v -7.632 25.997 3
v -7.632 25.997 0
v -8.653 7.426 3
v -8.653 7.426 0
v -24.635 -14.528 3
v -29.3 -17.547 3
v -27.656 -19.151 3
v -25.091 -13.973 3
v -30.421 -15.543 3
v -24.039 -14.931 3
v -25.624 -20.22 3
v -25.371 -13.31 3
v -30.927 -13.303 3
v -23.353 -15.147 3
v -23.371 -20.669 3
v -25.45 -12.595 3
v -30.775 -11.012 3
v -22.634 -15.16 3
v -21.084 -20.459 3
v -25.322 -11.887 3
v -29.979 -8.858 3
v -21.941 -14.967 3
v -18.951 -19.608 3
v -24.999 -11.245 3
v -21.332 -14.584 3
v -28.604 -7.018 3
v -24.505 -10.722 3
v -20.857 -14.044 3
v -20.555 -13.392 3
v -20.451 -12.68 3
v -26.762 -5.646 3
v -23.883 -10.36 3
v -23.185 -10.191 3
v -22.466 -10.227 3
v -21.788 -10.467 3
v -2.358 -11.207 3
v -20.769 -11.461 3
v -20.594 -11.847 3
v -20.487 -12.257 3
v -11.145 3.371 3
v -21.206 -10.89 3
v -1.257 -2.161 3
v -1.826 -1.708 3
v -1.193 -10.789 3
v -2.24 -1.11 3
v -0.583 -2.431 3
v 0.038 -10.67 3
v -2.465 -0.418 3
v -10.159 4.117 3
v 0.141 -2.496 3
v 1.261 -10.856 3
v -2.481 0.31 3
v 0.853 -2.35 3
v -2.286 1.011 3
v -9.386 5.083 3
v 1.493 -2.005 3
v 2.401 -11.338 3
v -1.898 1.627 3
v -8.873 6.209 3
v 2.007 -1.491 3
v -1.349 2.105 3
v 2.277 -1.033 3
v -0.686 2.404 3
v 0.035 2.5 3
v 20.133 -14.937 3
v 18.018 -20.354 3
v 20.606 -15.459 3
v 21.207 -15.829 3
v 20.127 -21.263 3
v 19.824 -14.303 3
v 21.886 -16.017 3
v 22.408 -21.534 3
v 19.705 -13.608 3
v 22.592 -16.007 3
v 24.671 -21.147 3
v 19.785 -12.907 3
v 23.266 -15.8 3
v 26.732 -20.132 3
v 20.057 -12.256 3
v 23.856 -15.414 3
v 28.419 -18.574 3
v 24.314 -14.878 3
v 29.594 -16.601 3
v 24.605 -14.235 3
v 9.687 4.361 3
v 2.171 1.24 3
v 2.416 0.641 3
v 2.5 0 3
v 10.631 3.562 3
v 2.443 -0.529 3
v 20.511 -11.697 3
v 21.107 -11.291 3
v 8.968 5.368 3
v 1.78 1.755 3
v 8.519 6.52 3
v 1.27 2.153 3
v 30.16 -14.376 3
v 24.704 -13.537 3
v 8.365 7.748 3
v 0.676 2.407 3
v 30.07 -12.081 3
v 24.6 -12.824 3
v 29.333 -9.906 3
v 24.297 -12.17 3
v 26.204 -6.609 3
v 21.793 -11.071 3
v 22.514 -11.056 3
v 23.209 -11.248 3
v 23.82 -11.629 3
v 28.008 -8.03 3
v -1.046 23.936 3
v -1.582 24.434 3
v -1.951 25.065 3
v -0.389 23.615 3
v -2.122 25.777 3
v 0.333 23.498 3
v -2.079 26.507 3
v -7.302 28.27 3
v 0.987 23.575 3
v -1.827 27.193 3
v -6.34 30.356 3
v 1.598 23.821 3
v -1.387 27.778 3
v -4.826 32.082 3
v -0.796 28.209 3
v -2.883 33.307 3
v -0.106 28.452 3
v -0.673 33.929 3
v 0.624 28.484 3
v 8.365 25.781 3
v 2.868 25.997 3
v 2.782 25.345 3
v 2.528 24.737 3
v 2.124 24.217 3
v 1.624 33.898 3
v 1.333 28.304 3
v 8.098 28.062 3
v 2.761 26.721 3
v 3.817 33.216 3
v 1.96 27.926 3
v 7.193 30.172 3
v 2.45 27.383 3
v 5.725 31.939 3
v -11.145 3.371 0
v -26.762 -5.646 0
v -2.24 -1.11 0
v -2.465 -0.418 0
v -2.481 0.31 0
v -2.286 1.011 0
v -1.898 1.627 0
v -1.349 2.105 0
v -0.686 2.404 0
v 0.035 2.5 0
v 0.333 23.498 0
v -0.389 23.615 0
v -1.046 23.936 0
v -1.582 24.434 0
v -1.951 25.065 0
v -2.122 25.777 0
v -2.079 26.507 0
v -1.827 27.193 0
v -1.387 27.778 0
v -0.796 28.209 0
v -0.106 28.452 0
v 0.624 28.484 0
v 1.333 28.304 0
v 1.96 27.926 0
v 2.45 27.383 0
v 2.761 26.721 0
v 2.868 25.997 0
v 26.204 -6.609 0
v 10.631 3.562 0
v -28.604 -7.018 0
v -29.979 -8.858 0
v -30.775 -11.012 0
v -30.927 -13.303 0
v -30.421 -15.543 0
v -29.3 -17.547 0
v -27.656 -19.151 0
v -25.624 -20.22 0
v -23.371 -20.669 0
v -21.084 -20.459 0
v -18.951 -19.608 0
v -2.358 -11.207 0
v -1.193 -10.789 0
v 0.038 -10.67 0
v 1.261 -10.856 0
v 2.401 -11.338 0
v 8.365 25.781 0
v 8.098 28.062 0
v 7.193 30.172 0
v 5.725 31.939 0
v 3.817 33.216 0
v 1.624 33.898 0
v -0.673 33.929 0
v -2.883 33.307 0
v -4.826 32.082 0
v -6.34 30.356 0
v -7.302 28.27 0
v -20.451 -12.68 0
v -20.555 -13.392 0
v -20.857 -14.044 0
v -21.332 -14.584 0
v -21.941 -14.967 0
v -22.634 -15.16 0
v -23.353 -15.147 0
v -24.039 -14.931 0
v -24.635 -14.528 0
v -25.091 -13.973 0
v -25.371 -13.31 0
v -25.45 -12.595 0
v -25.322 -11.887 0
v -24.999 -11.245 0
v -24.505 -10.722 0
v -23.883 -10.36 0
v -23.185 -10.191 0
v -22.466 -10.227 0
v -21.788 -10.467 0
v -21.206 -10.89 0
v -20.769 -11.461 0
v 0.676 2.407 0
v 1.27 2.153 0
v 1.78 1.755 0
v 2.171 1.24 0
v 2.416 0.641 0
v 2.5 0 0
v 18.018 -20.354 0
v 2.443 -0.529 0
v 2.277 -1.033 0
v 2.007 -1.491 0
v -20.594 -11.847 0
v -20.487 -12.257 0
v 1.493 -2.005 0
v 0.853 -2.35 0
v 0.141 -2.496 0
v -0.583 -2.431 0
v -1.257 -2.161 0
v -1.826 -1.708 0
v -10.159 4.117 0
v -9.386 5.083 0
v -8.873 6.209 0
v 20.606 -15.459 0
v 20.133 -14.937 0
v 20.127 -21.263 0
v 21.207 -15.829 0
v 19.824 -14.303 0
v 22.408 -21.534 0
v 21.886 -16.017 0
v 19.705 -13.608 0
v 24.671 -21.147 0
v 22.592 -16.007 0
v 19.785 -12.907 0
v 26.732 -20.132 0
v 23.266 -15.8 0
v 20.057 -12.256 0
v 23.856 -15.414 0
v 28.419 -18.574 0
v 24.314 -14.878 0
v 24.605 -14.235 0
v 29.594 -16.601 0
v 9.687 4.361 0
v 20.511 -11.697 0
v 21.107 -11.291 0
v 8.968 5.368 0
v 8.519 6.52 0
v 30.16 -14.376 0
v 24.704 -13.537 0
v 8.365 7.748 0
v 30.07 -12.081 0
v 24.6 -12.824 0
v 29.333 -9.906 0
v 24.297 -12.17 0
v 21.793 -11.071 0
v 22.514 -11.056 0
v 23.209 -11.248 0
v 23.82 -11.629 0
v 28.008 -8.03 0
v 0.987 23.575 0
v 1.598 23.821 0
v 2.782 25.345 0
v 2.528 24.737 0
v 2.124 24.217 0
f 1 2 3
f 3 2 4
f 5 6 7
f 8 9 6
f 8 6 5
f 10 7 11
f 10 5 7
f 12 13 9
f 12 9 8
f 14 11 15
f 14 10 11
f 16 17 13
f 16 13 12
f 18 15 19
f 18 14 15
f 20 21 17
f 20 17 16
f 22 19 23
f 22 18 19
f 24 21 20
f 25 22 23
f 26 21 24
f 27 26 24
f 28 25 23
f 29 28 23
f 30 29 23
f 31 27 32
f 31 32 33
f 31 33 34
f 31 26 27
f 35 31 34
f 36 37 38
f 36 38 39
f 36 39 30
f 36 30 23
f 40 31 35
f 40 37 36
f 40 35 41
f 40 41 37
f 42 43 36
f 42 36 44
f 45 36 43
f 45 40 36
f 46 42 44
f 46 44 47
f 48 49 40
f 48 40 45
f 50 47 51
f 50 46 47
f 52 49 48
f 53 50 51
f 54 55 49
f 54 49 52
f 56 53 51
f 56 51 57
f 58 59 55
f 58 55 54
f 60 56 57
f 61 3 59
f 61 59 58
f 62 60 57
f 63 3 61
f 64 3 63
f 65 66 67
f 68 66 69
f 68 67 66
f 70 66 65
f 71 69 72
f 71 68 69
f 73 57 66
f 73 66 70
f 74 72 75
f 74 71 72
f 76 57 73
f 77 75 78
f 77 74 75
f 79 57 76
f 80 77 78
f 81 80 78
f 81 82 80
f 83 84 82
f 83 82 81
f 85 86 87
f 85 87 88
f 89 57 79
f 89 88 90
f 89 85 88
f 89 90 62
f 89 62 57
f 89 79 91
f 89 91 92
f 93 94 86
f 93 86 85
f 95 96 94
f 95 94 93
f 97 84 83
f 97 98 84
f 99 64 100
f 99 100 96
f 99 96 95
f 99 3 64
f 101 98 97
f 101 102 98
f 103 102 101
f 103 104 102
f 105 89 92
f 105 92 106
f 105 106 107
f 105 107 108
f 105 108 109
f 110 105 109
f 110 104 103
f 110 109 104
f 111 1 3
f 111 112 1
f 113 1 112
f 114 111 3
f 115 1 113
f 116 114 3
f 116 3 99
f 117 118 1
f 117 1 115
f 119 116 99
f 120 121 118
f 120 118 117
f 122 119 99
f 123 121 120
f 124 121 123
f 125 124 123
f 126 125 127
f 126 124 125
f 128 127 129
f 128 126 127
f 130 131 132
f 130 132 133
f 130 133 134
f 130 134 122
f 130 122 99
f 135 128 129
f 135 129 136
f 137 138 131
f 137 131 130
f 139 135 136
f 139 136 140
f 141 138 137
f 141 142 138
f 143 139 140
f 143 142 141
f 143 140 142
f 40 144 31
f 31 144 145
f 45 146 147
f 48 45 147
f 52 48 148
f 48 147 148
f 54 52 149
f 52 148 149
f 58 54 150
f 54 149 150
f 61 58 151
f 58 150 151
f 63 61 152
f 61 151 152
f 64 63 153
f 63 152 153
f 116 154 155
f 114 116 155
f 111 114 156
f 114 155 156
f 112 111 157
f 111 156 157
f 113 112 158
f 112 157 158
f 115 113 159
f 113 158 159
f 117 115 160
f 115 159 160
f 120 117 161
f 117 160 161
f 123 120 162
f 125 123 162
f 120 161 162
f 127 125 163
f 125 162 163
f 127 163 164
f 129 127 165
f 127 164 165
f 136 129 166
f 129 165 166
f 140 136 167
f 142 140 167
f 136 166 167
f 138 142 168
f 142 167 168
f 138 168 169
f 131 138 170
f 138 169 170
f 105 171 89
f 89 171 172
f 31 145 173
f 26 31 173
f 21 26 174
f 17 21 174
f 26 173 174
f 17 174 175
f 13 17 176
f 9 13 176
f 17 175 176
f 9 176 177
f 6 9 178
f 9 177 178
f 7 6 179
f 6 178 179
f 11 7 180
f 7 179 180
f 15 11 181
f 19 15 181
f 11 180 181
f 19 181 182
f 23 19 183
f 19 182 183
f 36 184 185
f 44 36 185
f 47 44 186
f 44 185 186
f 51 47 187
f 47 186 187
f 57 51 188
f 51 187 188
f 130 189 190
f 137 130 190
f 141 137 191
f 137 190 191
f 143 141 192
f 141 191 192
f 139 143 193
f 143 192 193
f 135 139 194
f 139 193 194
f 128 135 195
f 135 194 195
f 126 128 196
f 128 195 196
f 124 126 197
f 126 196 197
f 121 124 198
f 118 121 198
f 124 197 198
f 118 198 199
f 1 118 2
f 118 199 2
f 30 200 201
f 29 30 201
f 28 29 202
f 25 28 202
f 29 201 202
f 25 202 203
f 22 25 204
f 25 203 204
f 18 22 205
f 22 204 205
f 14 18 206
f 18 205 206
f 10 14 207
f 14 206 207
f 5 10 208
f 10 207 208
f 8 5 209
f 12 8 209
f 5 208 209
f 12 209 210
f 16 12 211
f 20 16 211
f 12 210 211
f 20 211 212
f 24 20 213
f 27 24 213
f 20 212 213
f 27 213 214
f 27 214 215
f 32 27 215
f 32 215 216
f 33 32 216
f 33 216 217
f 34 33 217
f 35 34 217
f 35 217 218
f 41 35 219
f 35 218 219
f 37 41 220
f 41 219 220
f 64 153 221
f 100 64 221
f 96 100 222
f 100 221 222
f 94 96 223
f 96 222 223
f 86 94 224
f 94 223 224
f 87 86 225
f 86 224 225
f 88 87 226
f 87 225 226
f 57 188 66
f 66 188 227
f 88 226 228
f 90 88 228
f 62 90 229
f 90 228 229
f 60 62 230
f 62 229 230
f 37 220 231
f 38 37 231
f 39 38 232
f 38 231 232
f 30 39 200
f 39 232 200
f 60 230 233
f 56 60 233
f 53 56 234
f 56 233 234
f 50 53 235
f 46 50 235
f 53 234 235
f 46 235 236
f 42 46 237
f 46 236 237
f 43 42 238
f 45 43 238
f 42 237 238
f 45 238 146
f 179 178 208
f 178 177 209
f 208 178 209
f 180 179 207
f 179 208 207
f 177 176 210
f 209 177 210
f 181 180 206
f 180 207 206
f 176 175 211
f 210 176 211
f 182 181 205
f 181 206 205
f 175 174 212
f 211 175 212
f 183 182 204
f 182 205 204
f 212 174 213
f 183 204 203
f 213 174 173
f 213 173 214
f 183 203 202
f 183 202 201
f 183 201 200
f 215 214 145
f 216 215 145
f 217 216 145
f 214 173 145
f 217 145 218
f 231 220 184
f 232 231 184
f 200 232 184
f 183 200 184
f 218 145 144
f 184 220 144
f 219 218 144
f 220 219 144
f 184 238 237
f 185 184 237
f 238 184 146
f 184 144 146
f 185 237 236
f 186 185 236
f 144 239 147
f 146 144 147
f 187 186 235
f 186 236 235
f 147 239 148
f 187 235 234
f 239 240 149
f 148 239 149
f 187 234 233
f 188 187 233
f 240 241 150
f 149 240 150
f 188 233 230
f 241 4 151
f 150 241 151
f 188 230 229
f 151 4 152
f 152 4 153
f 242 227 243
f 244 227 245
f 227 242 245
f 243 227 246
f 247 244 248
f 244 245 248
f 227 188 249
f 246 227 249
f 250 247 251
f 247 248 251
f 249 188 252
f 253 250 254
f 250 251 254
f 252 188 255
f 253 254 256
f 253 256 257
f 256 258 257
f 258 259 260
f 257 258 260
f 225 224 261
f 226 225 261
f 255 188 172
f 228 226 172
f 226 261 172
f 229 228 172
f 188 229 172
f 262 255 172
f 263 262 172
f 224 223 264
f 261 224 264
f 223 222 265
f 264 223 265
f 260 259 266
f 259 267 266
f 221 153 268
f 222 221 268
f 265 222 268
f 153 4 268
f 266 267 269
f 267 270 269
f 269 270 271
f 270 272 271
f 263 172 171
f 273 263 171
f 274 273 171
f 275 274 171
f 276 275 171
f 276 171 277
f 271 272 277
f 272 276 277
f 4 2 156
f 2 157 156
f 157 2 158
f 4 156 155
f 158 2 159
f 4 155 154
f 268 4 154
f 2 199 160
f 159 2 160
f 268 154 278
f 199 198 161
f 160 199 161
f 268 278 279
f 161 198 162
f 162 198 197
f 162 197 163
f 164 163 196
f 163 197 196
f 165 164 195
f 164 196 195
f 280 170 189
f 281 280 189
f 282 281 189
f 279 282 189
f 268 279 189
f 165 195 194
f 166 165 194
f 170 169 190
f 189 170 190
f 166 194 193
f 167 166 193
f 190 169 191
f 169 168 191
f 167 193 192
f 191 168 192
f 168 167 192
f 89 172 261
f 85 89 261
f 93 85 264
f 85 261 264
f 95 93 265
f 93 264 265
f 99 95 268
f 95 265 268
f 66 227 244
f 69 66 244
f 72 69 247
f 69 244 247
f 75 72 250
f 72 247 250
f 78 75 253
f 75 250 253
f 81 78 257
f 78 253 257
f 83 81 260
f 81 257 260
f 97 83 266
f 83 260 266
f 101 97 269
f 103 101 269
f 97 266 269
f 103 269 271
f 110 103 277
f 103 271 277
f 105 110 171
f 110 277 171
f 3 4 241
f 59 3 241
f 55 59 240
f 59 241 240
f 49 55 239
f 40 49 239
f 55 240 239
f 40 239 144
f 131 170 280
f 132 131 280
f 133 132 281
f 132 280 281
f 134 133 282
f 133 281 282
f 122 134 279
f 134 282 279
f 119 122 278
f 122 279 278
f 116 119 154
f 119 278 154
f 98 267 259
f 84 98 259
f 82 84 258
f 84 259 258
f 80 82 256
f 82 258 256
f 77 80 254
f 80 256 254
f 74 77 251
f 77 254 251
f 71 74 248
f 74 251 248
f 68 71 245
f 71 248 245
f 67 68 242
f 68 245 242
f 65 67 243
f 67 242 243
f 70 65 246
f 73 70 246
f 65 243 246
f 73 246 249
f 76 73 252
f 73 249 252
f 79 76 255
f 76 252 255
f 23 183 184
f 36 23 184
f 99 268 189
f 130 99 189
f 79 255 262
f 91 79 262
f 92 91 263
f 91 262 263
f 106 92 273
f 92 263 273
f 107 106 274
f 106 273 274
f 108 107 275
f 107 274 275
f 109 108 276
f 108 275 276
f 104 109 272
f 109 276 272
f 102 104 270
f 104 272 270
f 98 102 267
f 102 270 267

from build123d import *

# Parameters (mm, degrees)
F1_DEPTH = 3


# Not quite as in the source:
# - a feature names something its author has since deleted; it is built from what else it names


with BuildPart() as f1:
    # F0 (on Top) → F1 (new body)
    with BuildSketch(Plane.XY):
        with BuildLine():
            Line((8.3654914828, 7.7478343503), (8.3654914828, 25.7808157751))
            ThreePointArc((8.3654914828, 25.7808157751), (0.4767203504, 33.9966565171), (-7.631576467, 25.9973895632))
            Line((-7.631576467, 25.9973895632), (-8.6528857034, 7.4260866897))
            ThreePointArc((-8.6528857034, 7.4260866897), (-9.3855131516, 5.0826540918), (-11.1453419747, 3.3705145438))
            Line((-11.1453419747, 3.3705145438), (-26.7623619946, -5.6459761686))
            ThreePointArc((-26.7623619946, -5.6459761686), (-29.9331032244, -16.585772745), (-18.951386422, -19.6081302933))
            Line((-18.951386422, -19.6081302933), (-2.3575117339, -11.2069586004))
            ThreePointArc((-2.3575117339, -11.2069586004), (0.038274152, -10.6697162831), (2.400944907, -11.3377029763))
            Line((2.400944907, -11.3377029763), (18.0179649268, -20.3541936886))
            ThreePointArc((18.0179649268, -20.3541936886), (29.0774772891, -17.6302378543), (26.204057304, -6.6086133521))
            Line((26.204057304, -6.6086133521), (10.6314918524, 3.5615178285))
            ThreePointArc((10.6314918524, 3.5615178285), (8.9683334147, 5.3677081091), (8.3654914828, 7.7478343503))
        make_face()
        with BuildLine():
            ThreePointArc((-20.451386422, -12.679927063), (-25.3707248656, -13.3098488797), (-20.7688276181, -11.4607318089))
            ThreePointArc((-20.7688276181, -11.4607318089), (-20.5320479783, -12.0500052463), (-20.451386422, -12.679927063))
        make_face(mode=Mode.SUBTRACT)
        with BuildLine():
            ThreePointArc((24.704057304, -13.5368165824), (21.5399163779, -15.9469860432), (20.0569238399, -12.25626284))
            ThreePointArc((20.0569238399, -12.25626284), (22.8681982302, -11.1266471215), (24.704057304, -13.5368165824))
        make_face(mode=Mode.SUBTRACT)
        with BuildLine():
            ThreePointArc((-7.9164689421, -4.2812988086), (-7.6979940139, 4.6627125327), (0.127531223, 8.9990963873))
            ThreePointArc((0.127531223, 8.9990963873), (6.4088915191, 6.3187110629), (9, 0))
            ThreePointArc((9, 0), (8.6421794957, -2.5125153857), (7.5971703192, -4.8252464332))
            ThreePointArc((7.5971703192, -4.8252464332), (-0.315369081, -8.9944728774), (-7.9164689421, -4.2812988086))
        make_face(mode=Mode.SUBTRACT)
        with BuildLine():
            ThreePointArc((2.868423533, 25.9973895632), (2.1236210505, 24.217141919), (0.3329981933, 23.4976405667))
            ThreePointArc((0.3329981933, 23.4976405667), (-1.3867739845, 27.7776372074), (2.868423533, 25.9973895632))
        make_face(mode=Mode.SUBTRACT)
        with BuildLine():
            ThreePointArc((0.0354253397, 2.4997489965), (1.7802476442, 1.7551975175), (2.5, 0))
            ThreePointArc((2.5, 0), (2.3734655501, -0.7852778377), (2.0066709741, -1.4910639161))
            Line((2.0066709741, -1.4910639161), (7.5971703192, -4.8252464332))
            ThreePointArc((7.5971703192, -4.8252464332), (8.6421794957, -2.5125153857), (9, 0))
            ThreePointArc((9, 0), (6.4088915191, 6.3187110629), (0.127531223, 8.9990963873))
            Line((0.127531223, 8.9990963873), (0.0354253397, 2.4997489965))
        make_face()
        with BuildLine():
            ThreePointArc((-2.239906233, -1.1103243073), (-2.1149683962, 1.333007383), (0.0354253397, 2.4997489965))
            Line((0.0354253397, 2.4997489965), (0.127531223, 8.9990963873))
            ThreePointArc((0.127531223, 8.9990963873), (-7.6979940139, 4.6627125327), (-7.9164689421, -4.2812988086))
            Line((-7.9164689421, -4.2812988086), (-2.239906233, -1.1103243073))
        make_face()
        with BuildLine():
            Line((7.5971703192, -4.8252464332), (2.0066709741, -1.4910639161))
            ThreePointArc((2.0066709741, -1.4910639161), (-0.2232494881, -2.4900119811), (-2.239906233, -1.1103243073))
            Line((-2.239906233, -1.1103243073), (-7.9164689421, -4.2812988086))
            ThreePointArc((-7.9164689421, -4.2812988086), (-0.315369081, -8.9944728774), (7.5971703192, -4.8252464332))
        make_face()
    extrude(amount=F1_DEPTH)


solid = f1.part
